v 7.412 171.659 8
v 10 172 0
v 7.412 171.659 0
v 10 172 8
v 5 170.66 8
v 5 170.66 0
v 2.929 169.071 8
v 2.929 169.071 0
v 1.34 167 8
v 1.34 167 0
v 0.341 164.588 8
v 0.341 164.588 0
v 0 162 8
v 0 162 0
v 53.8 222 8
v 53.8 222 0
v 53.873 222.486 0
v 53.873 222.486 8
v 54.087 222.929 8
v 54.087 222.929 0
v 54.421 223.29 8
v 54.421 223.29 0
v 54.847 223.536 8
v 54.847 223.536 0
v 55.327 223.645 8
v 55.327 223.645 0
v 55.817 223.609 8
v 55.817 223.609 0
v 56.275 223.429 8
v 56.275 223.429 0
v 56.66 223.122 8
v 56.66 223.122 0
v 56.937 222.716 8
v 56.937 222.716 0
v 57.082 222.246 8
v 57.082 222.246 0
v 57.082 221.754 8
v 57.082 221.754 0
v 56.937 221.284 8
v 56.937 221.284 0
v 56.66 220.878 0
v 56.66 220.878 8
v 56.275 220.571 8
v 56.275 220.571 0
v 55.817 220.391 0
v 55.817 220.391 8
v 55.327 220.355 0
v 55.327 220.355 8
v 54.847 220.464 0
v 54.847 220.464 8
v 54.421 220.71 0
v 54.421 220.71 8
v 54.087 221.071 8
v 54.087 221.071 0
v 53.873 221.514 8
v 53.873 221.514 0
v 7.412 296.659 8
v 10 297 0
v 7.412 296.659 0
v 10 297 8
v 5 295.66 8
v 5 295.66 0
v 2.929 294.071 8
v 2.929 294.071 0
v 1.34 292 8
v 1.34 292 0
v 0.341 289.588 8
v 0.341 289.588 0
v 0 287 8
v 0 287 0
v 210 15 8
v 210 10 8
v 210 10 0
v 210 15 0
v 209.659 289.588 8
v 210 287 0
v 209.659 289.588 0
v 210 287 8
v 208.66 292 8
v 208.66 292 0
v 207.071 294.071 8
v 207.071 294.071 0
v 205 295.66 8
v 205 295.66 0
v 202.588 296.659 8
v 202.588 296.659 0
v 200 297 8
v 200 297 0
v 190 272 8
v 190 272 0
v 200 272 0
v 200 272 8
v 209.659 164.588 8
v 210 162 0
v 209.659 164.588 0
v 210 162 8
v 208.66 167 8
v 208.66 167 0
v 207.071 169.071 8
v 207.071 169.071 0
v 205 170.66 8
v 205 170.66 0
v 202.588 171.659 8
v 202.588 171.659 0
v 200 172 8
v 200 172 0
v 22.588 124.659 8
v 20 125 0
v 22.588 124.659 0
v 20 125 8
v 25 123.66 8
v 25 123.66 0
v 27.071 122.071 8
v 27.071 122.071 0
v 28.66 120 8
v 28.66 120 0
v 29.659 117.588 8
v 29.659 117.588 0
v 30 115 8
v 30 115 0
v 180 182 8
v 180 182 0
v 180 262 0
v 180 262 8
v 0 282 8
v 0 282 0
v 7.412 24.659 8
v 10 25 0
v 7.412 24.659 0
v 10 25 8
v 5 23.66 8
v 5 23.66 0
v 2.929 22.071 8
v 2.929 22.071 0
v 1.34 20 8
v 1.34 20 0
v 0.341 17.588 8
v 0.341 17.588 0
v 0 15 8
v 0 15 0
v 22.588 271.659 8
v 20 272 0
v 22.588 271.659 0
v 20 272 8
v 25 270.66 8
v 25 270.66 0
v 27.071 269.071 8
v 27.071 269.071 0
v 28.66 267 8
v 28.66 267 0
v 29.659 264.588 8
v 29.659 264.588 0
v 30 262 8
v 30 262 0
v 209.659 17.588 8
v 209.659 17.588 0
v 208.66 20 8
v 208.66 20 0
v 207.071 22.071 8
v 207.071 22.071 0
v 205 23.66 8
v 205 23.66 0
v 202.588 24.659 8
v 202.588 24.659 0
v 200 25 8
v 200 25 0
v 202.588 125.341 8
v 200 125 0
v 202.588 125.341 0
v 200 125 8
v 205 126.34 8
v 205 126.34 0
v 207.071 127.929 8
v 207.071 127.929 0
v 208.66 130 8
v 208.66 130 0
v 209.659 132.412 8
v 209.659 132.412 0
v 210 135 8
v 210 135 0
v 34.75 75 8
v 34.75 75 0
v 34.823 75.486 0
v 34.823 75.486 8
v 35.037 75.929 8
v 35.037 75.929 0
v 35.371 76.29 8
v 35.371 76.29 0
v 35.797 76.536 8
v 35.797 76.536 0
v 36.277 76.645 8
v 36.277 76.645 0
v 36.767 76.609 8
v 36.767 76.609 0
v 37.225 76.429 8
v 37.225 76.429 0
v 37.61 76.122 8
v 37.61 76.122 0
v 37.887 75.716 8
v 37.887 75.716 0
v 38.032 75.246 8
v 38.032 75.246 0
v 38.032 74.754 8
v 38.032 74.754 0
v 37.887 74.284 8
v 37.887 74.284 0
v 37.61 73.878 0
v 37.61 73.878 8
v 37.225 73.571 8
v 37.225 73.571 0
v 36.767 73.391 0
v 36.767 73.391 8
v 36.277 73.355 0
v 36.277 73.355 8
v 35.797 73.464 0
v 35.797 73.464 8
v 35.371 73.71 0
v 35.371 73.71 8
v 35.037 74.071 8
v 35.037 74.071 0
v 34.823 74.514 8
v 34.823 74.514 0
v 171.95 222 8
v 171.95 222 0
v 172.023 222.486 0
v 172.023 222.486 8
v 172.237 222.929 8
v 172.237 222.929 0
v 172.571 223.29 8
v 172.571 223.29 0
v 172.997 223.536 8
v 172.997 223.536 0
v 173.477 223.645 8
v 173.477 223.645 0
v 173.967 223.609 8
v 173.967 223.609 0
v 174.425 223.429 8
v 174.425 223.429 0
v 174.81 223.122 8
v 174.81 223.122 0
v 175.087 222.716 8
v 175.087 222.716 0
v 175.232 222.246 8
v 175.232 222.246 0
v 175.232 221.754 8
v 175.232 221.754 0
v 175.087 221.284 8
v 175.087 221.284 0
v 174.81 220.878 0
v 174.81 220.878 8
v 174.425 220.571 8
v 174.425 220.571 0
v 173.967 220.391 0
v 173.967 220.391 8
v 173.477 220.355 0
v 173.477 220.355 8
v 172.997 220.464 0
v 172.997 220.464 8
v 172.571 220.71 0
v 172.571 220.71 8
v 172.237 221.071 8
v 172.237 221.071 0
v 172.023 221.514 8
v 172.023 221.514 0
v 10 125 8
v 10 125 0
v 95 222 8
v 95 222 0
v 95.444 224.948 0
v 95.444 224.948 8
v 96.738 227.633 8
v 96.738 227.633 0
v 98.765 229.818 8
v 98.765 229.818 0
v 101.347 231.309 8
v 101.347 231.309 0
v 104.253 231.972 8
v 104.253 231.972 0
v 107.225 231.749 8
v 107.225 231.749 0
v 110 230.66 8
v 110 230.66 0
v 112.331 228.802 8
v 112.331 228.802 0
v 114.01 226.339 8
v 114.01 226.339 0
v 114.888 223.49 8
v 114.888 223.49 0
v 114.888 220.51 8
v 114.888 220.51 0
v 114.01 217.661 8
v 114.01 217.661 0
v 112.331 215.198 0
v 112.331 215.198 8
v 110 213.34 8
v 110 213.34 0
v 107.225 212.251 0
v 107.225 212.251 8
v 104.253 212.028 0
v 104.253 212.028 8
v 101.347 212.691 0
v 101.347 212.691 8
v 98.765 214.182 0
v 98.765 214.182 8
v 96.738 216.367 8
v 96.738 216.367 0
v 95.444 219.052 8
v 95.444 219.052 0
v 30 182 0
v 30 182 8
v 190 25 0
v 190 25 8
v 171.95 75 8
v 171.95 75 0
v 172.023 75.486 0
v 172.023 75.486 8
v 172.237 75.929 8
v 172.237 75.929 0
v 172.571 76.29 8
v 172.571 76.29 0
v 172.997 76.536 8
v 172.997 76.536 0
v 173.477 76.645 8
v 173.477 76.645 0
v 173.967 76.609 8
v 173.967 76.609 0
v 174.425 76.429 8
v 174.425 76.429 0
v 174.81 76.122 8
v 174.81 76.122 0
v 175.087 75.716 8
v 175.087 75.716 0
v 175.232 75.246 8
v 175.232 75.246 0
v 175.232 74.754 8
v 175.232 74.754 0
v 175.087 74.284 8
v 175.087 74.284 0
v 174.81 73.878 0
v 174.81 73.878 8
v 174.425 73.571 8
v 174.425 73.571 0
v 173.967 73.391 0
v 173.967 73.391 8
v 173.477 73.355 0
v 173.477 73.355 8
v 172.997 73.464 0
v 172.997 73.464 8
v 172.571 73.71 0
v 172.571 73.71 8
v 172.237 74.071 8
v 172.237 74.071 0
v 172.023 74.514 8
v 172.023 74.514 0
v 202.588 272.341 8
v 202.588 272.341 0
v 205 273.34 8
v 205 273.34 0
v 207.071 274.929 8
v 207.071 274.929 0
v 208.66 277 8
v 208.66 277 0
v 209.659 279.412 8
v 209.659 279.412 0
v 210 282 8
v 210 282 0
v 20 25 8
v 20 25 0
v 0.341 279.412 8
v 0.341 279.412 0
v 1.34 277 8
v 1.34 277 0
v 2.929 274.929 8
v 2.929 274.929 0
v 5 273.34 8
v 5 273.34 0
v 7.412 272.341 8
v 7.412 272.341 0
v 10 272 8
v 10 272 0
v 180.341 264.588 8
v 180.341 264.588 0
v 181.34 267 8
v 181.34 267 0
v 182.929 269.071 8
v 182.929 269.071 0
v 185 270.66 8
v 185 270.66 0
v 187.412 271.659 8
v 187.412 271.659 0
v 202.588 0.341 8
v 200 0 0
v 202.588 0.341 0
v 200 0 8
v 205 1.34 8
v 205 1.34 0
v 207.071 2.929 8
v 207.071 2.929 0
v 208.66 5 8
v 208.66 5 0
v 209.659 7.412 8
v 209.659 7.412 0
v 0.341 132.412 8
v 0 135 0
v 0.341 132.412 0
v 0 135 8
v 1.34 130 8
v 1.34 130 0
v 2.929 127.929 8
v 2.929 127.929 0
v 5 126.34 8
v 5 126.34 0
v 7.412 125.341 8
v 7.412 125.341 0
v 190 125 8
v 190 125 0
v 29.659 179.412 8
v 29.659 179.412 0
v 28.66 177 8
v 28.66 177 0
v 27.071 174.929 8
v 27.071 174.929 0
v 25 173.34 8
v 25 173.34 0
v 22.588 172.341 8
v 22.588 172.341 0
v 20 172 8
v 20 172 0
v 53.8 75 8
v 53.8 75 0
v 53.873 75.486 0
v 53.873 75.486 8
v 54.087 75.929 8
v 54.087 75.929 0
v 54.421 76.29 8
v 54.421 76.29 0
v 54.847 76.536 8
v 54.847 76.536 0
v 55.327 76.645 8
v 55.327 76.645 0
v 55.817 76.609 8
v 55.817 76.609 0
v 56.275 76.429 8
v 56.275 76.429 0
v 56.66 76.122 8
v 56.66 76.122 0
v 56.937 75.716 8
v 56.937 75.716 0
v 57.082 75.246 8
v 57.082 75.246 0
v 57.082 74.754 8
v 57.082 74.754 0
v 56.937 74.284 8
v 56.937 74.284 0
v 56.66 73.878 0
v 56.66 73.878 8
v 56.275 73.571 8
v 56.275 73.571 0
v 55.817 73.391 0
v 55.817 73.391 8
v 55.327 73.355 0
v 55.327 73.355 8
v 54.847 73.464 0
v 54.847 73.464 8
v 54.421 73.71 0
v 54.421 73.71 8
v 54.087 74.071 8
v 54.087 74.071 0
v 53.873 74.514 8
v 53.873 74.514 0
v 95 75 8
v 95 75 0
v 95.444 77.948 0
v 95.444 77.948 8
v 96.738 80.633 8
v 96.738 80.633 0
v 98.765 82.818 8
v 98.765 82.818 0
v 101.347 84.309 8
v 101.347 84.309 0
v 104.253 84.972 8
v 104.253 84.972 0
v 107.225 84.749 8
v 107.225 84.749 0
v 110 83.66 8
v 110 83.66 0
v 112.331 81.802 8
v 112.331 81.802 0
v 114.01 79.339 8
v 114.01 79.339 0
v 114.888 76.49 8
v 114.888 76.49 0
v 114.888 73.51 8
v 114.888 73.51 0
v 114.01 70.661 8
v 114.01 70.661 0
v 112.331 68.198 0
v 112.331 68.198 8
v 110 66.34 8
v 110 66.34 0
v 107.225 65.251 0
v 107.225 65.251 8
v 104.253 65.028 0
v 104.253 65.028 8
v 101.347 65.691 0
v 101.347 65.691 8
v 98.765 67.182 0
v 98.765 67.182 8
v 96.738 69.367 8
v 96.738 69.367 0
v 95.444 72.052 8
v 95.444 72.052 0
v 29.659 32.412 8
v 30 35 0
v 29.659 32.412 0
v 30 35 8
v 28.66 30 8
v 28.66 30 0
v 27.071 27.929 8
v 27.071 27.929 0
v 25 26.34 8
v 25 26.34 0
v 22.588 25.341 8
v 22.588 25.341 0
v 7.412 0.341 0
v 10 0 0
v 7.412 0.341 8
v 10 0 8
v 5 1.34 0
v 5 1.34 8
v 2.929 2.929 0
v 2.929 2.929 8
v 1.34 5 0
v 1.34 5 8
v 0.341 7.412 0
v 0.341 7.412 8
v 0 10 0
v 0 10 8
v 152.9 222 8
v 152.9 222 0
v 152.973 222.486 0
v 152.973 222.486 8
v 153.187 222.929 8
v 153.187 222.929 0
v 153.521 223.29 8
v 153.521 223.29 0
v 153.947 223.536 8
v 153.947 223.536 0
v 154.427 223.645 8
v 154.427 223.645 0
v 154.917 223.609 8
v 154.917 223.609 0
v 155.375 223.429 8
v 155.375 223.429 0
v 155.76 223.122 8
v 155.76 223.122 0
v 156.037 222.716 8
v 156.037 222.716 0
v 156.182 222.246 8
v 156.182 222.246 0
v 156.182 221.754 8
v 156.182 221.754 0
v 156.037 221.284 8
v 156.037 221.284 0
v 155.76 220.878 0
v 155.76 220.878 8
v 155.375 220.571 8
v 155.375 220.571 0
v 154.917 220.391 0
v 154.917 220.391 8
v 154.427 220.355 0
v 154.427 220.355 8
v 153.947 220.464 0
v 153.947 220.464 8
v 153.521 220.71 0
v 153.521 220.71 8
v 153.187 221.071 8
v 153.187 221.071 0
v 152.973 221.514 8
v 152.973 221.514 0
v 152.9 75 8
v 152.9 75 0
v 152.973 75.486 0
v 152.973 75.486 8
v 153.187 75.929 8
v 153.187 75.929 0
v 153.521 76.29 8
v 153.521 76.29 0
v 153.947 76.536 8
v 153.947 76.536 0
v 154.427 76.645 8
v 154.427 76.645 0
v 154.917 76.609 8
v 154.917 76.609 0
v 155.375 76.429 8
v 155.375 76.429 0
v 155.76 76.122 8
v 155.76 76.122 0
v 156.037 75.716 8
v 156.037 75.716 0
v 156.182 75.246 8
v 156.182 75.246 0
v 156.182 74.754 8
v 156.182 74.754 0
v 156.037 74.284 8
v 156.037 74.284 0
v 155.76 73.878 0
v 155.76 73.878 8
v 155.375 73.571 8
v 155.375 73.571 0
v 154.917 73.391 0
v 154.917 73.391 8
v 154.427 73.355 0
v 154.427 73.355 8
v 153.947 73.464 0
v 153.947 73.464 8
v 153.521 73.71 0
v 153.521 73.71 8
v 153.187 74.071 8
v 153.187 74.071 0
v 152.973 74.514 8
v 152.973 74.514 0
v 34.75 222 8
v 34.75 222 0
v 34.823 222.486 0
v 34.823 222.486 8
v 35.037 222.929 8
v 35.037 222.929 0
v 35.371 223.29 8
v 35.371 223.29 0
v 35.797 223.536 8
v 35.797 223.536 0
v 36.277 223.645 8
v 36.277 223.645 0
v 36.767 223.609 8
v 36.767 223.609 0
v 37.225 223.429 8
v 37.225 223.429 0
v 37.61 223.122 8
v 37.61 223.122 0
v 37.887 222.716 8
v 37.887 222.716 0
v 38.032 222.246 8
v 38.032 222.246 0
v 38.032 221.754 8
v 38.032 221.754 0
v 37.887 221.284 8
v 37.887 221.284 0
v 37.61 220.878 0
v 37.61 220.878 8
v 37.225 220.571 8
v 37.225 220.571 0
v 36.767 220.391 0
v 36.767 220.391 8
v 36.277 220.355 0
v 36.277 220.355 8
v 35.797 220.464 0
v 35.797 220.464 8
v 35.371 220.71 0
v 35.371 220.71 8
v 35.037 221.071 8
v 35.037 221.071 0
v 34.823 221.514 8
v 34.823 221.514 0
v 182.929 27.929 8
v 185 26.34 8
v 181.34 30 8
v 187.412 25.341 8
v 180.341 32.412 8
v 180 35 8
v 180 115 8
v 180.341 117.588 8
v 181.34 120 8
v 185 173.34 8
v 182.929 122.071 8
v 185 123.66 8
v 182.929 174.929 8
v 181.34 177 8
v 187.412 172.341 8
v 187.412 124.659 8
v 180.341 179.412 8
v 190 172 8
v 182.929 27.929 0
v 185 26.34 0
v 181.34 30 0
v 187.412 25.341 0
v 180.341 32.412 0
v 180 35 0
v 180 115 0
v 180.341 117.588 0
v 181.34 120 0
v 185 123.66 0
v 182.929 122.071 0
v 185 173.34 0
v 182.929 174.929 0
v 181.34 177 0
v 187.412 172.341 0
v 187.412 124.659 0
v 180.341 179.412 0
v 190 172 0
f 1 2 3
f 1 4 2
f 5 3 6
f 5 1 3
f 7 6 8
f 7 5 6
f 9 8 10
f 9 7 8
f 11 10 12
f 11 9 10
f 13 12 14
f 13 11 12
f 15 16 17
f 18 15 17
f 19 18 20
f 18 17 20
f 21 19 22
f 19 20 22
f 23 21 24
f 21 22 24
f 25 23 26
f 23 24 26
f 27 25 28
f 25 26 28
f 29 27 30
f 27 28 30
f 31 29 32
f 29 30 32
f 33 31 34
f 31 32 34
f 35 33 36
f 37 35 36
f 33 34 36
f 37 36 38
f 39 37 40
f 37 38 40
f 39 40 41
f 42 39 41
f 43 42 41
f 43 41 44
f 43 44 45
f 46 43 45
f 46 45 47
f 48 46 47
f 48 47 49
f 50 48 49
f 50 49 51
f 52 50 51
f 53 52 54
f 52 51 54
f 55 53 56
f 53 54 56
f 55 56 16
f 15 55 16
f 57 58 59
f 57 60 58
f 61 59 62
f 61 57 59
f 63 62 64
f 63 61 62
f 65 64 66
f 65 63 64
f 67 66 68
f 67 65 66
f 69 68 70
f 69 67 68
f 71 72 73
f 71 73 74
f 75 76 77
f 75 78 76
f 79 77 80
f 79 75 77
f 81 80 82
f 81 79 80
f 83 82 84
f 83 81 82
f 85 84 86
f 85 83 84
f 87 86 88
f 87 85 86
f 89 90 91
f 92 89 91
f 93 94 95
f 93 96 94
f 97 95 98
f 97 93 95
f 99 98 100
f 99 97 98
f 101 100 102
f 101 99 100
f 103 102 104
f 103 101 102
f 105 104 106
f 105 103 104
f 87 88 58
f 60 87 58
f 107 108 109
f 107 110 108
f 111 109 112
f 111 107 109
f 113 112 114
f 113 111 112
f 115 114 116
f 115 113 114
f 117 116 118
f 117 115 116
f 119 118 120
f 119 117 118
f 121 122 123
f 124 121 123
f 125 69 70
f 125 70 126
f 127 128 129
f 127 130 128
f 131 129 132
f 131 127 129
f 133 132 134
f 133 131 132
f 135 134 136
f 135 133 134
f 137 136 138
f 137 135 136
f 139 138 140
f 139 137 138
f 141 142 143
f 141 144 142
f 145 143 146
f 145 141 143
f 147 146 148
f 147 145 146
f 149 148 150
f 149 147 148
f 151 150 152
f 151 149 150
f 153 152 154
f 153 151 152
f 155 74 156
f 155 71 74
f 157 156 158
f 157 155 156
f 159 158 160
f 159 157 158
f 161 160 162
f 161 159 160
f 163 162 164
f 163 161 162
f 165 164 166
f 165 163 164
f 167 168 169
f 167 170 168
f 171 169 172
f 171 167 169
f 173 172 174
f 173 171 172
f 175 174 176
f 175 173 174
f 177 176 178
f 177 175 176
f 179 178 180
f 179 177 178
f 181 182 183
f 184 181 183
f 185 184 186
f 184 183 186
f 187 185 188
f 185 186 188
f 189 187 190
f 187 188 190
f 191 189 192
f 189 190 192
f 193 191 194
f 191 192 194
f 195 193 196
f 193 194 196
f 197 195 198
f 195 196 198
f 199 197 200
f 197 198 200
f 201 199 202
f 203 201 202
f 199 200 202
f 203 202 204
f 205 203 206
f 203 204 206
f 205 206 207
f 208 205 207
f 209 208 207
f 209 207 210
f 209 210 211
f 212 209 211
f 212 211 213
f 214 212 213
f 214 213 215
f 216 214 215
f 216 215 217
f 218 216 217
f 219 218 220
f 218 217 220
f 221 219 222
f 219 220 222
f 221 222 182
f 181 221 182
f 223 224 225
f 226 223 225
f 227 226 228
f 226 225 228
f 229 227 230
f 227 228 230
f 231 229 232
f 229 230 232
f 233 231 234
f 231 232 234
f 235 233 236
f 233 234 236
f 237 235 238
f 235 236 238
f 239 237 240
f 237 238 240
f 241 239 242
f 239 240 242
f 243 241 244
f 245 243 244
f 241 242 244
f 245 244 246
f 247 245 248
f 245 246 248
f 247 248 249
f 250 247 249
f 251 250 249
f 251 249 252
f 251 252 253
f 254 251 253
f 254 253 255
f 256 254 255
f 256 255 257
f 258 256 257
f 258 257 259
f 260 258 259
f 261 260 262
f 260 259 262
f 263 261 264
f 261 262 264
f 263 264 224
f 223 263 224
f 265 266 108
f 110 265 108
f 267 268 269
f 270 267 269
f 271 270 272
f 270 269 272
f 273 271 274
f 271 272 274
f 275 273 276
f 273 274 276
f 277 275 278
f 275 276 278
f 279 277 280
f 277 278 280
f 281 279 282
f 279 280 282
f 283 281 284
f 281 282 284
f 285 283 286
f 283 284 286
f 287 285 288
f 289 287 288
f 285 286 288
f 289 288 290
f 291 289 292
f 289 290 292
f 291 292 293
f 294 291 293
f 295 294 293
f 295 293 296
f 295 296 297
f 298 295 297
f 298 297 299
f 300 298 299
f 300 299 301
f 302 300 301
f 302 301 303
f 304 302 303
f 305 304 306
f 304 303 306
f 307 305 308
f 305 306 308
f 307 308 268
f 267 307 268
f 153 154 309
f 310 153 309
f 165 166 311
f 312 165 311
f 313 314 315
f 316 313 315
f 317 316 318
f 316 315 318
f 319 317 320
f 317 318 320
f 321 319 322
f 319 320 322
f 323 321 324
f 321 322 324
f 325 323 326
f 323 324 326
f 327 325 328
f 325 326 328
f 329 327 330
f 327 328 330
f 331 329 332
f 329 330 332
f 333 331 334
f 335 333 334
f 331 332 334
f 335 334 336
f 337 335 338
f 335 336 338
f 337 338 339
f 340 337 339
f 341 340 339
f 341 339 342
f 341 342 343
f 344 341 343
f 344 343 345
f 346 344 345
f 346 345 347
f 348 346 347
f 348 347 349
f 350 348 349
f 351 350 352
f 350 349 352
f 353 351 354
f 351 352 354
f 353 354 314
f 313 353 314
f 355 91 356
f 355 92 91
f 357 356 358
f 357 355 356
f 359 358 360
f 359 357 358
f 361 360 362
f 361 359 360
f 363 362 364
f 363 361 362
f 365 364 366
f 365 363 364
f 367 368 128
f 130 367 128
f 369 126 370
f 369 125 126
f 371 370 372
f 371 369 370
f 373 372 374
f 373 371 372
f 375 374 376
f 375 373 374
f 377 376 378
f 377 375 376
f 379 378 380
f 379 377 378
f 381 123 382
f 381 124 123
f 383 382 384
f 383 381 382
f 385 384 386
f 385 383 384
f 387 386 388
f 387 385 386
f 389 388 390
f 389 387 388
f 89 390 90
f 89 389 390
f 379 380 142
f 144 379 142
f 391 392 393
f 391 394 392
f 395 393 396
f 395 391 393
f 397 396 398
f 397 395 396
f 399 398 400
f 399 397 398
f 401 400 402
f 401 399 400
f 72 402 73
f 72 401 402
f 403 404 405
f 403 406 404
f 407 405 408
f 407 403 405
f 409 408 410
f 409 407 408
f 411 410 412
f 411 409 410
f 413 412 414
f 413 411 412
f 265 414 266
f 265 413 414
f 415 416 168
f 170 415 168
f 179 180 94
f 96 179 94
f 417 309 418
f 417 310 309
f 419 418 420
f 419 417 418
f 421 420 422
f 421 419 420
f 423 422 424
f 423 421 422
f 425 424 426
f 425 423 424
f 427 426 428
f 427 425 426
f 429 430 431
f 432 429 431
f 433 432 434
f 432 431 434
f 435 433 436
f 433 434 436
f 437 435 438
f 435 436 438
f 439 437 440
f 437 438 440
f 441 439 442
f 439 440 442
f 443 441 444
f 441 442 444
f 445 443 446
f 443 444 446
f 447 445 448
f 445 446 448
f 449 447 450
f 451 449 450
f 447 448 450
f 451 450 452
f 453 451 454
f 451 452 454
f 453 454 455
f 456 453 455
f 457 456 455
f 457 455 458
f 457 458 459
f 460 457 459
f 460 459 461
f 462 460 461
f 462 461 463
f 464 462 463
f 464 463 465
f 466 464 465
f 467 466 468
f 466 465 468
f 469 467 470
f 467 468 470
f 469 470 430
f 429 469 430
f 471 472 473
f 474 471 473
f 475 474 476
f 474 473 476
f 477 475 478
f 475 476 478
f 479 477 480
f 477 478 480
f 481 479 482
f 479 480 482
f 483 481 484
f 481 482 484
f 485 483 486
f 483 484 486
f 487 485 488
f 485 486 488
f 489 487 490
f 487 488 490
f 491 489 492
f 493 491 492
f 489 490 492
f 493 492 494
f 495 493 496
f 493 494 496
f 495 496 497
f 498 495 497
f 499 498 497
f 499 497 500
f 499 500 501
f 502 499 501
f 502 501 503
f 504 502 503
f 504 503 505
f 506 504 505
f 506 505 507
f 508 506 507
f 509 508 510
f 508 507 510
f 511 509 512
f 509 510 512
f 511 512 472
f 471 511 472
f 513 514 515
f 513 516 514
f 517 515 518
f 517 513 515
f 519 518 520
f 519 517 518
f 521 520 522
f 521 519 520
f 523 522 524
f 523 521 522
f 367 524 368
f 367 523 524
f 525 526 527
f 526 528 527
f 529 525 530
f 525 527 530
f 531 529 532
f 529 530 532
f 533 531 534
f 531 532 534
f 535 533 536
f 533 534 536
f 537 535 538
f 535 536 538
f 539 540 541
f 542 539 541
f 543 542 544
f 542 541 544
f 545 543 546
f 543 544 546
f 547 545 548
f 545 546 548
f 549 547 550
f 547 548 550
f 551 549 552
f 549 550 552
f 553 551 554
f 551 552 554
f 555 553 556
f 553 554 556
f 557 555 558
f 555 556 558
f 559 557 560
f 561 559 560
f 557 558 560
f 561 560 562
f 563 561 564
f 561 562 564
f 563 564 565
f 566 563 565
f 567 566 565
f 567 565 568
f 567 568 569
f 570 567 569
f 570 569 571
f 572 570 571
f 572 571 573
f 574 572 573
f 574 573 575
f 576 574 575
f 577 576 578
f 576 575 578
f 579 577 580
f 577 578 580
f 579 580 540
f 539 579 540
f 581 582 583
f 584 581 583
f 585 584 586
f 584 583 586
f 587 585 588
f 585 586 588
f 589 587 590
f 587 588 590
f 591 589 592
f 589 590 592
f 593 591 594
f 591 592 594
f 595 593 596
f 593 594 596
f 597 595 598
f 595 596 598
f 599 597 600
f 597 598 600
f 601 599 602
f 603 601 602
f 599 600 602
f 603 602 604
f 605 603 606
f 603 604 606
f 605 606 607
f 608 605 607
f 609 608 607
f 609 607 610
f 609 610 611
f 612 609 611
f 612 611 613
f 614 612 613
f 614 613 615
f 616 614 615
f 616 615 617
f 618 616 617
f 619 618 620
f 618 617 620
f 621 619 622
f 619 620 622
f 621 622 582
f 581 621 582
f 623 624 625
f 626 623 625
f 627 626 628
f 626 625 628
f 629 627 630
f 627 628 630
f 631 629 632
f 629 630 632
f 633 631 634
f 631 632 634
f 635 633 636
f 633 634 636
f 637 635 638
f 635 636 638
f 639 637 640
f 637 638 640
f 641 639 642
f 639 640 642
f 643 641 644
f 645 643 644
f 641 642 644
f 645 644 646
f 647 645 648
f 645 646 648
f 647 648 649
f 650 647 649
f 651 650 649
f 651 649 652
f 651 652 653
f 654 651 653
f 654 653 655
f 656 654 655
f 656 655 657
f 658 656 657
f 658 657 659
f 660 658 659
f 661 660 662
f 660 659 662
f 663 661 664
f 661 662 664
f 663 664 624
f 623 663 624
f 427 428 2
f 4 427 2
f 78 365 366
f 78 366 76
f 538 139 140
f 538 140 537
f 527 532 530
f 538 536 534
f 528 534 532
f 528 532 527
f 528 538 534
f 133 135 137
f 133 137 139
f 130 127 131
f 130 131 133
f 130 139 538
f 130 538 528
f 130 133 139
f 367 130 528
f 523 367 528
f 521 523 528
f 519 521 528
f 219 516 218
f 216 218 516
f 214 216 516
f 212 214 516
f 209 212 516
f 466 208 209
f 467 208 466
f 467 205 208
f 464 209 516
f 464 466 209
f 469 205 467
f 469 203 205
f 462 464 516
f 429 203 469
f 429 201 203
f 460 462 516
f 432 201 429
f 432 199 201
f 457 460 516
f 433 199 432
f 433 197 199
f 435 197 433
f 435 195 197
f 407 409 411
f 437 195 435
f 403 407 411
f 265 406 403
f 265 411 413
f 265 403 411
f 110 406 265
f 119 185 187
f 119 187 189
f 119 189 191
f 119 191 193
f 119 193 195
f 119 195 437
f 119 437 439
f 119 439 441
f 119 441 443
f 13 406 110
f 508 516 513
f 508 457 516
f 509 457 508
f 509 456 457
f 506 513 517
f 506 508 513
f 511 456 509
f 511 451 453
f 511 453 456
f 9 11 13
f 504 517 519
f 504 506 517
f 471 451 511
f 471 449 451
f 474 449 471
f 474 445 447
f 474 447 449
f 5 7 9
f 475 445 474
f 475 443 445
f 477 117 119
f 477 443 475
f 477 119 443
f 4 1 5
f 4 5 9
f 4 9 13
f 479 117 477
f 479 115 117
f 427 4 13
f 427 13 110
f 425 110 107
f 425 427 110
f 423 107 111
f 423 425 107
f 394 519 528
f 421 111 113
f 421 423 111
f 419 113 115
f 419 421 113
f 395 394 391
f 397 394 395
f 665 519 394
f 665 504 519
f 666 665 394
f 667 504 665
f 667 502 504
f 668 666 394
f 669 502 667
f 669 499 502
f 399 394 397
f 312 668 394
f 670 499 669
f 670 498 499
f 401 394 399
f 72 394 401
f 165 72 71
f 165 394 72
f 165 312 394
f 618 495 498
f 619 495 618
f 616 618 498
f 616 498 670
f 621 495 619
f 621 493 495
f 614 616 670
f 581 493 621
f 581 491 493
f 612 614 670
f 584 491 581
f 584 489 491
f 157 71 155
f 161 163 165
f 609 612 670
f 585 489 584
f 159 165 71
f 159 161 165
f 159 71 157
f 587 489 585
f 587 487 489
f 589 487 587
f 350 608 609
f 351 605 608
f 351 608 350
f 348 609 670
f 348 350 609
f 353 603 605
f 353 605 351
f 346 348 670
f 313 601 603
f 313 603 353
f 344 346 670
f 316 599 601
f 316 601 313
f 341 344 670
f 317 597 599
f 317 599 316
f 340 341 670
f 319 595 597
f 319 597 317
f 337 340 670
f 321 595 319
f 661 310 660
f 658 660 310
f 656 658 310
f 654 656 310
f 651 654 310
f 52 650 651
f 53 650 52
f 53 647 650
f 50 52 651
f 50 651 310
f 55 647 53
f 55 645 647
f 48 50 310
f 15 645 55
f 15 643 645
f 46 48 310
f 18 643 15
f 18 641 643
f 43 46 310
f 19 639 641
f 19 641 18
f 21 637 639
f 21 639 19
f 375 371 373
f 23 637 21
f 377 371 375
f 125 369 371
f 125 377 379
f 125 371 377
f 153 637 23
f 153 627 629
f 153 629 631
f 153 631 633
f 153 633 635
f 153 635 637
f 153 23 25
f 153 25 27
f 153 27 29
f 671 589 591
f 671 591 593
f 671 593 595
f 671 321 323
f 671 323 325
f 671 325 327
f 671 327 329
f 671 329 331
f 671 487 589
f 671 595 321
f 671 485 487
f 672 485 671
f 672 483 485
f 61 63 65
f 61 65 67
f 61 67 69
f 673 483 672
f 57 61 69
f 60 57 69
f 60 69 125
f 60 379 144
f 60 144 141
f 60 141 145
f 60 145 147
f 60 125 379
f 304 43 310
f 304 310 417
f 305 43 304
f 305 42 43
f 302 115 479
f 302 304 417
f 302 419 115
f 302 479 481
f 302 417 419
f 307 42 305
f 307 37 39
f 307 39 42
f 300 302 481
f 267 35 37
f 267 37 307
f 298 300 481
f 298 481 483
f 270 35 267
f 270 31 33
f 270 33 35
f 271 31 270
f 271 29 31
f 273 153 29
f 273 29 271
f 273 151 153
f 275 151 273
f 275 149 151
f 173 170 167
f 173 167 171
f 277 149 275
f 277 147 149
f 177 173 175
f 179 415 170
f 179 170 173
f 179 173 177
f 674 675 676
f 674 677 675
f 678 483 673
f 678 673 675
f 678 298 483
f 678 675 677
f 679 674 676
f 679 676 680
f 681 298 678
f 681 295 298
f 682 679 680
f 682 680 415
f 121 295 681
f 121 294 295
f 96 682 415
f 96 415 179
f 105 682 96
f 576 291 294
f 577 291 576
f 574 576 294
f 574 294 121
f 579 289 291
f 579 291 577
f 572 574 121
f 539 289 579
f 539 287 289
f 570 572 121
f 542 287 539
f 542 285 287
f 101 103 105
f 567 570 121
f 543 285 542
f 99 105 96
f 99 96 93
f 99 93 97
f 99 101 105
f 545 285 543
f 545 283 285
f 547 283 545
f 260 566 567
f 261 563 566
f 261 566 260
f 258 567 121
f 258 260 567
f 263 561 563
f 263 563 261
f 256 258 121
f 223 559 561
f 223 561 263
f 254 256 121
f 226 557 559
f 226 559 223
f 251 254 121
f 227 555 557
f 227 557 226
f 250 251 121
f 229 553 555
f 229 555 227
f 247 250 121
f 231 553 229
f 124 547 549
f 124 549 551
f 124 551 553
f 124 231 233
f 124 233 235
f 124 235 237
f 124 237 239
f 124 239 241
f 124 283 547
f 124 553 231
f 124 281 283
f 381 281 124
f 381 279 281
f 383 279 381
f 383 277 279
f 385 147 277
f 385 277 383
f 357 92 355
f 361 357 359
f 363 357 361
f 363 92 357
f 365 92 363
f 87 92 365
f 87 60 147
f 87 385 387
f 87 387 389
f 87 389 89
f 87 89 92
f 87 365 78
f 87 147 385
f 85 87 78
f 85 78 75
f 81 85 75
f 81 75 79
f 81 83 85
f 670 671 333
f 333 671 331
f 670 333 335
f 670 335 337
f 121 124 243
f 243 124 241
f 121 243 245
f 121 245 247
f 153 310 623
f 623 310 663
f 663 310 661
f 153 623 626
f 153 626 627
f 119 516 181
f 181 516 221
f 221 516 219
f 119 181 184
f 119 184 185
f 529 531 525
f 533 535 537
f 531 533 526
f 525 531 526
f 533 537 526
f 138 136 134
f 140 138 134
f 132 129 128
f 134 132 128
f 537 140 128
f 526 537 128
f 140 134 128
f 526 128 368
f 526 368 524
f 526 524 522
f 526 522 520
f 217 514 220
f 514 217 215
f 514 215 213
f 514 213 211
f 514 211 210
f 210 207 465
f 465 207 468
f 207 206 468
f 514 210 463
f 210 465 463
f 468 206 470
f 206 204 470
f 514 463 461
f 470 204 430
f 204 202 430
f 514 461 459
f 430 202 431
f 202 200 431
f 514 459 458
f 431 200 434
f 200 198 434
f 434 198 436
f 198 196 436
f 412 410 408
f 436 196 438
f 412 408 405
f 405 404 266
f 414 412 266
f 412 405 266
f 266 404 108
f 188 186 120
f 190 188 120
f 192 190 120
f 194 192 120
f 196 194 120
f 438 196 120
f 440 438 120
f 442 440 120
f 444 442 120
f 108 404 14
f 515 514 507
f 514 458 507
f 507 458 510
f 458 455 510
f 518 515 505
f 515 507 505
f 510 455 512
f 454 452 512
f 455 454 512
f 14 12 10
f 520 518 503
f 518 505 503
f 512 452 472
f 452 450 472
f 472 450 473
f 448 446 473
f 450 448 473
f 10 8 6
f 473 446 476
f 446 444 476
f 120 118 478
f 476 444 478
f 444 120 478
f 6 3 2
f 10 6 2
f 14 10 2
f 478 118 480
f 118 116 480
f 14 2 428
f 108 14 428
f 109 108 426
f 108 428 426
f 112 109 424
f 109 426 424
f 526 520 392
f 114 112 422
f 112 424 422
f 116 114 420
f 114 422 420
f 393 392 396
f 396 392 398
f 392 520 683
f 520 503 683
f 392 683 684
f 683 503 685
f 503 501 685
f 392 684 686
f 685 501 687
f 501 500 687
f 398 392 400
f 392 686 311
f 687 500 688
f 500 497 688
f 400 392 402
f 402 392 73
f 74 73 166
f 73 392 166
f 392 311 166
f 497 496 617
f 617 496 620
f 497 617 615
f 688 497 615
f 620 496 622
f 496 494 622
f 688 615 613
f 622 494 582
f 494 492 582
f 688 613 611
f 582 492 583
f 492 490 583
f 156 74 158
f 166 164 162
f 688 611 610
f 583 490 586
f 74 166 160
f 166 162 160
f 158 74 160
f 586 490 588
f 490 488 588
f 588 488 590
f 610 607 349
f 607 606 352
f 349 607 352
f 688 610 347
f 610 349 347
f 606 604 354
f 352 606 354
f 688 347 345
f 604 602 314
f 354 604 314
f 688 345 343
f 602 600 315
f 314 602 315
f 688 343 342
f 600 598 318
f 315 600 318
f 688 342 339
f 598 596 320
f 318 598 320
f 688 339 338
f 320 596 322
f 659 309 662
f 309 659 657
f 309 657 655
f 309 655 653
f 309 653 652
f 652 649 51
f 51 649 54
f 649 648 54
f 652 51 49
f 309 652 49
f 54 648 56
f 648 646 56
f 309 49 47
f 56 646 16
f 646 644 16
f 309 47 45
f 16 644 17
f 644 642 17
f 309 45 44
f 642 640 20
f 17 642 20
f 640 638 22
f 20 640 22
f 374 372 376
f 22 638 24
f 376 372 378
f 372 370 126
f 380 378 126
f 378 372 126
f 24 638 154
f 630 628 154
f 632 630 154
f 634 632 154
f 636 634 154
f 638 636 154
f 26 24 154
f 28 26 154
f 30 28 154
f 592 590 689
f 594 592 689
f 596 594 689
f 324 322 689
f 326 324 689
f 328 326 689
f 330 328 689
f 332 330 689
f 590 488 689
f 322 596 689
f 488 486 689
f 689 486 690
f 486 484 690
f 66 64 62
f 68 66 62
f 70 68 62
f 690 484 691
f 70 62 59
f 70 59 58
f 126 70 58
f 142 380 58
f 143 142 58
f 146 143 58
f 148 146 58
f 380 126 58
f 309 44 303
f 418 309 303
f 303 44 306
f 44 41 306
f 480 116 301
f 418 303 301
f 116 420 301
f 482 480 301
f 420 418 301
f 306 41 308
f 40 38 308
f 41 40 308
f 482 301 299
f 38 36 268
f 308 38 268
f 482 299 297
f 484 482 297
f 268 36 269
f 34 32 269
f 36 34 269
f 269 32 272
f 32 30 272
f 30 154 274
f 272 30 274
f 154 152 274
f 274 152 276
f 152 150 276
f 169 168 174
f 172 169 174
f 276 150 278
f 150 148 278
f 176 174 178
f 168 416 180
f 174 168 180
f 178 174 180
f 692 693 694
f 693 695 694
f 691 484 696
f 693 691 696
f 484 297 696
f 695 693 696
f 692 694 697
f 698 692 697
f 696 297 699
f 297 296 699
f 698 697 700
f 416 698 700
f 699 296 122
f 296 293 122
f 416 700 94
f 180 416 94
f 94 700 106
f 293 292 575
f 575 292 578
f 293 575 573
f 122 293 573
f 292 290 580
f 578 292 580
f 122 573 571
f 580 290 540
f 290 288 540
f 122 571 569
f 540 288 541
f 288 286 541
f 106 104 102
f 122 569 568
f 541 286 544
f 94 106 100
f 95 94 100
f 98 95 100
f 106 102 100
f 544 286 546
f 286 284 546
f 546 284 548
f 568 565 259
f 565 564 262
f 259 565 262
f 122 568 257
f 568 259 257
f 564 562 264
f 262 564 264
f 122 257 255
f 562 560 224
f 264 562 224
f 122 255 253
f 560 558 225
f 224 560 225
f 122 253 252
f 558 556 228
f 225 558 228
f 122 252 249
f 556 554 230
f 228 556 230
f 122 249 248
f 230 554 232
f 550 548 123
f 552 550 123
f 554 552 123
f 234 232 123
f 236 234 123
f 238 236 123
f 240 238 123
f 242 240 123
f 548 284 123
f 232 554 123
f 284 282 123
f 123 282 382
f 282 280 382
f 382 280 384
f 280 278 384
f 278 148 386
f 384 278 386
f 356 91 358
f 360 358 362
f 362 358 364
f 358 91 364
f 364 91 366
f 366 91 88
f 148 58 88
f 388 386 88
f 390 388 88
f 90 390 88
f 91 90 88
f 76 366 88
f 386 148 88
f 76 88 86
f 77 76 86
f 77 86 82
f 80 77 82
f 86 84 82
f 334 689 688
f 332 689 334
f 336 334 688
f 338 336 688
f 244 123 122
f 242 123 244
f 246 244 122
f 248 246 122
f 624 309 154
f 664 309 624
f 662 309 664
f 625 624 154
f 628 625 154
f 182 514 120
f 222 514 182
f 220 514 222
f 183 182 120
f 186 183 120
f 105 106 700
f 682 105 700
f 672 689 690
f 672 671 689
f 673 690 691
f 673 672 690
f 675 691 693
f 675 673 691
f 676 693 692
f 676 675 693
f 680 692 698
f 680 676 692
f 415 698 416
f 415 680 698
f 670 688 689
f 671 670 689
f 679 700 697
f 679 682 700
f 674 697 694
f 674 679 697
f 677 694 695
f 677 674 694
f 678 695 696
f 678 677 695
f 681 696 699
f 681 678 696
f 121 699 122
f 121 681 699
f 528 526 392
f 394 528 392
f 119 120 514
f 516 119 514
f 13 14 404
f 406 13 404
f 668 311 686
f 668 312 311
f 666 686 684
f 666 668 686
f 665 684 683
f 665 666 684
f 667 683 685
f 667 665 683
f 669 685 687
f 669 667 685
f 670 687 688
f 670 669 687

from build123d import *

# Parameters (mm, degrees)
P_IDAT_VYSUNUT_M2_DEPTH  = 8
ZAOBLIT1_R               = 10
SKICA2_R                 = 1.65
SKICA2_R_2               = 10
ODEBRAT_VYSUNUT_M1_DEPTH = 8


with BuildPart() as part:
    # Skica1 → Přidat vysunutím2 (new body)
    with BuildSketch(Plane.XY):
        Polygon((0, 0), (210, 0), (210, 25), (180, 25), (180, 125), (210, 125), (210, 172), (180, 172), (180, 272), (210, 272), (210, 297), (0, 297), (0, 272), (30, 272), (30, 172), (0, 172), (0, 125), (30, 125), (30, 25), (0, 25), align=None)
    extrude(amount=P_IDAT_VYSUNUT_M2_DEPTH)

    # Zaoblit1
    zaoblit1_edges = [part.edges().sort_by_distance(p)[0] for p in [
        (0, 25, 4),
        (30, 25, 4),
        (30, 125, 4),
        (0, 125, 4),
        (0, 172, 4),
        (30, 172, 4),
        (30, 272, 4),
        (0, 272, 4),
        (0, 297, 4),
        (210, 297, 4),
        (210, 272, 4),
        (180, 272, 4),
        (180, 172, 4),
        (210, 172, 4),
        (210, 125, 4),
        (180, 125, 4),
        (180, 25, 4),
        (210, 25, 4),
        (210, 0, 4),
        (0, 0, 4),
    ]]
    fillet(zaoblit1_edges, radius=ZAOBLIT1_R)

    # Skica2 → Odebrat vysunutím1 (cut)
    with BuildSketch(Plane(origin=(0, 0, 0), x_dir=(-1, 0, 0), z_dir=(0, 0, -1))):
        with Locations((-173.6, 222)):
            Circle(SKICA2_R)
        with Locations((-36.4, 222)):
            Circle(SKICA2_R)
        with Locations((-55.45, 222)):
            Circle(SKICA2_R)
        with Locations((-154.55, 222)):
            Circle(SKICA2_R)
        with Locations((-173.6, 75)):
            Circle(SKICA2_R)
        with Locations((-154.55, 75)):
            Circle(SKICA2_R)
        with Locations((-55.45, 75)):
            Circle(SKICA2_R)
        with Locations((-36.4, 75)):
            Circle(SKICA2_R)
        with Locations((-105, 75)):
            Circle(SKICA2_R_2)
        with Locations((-105, 222)):
            Circle(SKICA2_R_2)
    extrude(amount=-ODEBRAT_VYSUNUT_M1_DEPTH, mode=Mode.SUBTRACT)


solid = part.part
